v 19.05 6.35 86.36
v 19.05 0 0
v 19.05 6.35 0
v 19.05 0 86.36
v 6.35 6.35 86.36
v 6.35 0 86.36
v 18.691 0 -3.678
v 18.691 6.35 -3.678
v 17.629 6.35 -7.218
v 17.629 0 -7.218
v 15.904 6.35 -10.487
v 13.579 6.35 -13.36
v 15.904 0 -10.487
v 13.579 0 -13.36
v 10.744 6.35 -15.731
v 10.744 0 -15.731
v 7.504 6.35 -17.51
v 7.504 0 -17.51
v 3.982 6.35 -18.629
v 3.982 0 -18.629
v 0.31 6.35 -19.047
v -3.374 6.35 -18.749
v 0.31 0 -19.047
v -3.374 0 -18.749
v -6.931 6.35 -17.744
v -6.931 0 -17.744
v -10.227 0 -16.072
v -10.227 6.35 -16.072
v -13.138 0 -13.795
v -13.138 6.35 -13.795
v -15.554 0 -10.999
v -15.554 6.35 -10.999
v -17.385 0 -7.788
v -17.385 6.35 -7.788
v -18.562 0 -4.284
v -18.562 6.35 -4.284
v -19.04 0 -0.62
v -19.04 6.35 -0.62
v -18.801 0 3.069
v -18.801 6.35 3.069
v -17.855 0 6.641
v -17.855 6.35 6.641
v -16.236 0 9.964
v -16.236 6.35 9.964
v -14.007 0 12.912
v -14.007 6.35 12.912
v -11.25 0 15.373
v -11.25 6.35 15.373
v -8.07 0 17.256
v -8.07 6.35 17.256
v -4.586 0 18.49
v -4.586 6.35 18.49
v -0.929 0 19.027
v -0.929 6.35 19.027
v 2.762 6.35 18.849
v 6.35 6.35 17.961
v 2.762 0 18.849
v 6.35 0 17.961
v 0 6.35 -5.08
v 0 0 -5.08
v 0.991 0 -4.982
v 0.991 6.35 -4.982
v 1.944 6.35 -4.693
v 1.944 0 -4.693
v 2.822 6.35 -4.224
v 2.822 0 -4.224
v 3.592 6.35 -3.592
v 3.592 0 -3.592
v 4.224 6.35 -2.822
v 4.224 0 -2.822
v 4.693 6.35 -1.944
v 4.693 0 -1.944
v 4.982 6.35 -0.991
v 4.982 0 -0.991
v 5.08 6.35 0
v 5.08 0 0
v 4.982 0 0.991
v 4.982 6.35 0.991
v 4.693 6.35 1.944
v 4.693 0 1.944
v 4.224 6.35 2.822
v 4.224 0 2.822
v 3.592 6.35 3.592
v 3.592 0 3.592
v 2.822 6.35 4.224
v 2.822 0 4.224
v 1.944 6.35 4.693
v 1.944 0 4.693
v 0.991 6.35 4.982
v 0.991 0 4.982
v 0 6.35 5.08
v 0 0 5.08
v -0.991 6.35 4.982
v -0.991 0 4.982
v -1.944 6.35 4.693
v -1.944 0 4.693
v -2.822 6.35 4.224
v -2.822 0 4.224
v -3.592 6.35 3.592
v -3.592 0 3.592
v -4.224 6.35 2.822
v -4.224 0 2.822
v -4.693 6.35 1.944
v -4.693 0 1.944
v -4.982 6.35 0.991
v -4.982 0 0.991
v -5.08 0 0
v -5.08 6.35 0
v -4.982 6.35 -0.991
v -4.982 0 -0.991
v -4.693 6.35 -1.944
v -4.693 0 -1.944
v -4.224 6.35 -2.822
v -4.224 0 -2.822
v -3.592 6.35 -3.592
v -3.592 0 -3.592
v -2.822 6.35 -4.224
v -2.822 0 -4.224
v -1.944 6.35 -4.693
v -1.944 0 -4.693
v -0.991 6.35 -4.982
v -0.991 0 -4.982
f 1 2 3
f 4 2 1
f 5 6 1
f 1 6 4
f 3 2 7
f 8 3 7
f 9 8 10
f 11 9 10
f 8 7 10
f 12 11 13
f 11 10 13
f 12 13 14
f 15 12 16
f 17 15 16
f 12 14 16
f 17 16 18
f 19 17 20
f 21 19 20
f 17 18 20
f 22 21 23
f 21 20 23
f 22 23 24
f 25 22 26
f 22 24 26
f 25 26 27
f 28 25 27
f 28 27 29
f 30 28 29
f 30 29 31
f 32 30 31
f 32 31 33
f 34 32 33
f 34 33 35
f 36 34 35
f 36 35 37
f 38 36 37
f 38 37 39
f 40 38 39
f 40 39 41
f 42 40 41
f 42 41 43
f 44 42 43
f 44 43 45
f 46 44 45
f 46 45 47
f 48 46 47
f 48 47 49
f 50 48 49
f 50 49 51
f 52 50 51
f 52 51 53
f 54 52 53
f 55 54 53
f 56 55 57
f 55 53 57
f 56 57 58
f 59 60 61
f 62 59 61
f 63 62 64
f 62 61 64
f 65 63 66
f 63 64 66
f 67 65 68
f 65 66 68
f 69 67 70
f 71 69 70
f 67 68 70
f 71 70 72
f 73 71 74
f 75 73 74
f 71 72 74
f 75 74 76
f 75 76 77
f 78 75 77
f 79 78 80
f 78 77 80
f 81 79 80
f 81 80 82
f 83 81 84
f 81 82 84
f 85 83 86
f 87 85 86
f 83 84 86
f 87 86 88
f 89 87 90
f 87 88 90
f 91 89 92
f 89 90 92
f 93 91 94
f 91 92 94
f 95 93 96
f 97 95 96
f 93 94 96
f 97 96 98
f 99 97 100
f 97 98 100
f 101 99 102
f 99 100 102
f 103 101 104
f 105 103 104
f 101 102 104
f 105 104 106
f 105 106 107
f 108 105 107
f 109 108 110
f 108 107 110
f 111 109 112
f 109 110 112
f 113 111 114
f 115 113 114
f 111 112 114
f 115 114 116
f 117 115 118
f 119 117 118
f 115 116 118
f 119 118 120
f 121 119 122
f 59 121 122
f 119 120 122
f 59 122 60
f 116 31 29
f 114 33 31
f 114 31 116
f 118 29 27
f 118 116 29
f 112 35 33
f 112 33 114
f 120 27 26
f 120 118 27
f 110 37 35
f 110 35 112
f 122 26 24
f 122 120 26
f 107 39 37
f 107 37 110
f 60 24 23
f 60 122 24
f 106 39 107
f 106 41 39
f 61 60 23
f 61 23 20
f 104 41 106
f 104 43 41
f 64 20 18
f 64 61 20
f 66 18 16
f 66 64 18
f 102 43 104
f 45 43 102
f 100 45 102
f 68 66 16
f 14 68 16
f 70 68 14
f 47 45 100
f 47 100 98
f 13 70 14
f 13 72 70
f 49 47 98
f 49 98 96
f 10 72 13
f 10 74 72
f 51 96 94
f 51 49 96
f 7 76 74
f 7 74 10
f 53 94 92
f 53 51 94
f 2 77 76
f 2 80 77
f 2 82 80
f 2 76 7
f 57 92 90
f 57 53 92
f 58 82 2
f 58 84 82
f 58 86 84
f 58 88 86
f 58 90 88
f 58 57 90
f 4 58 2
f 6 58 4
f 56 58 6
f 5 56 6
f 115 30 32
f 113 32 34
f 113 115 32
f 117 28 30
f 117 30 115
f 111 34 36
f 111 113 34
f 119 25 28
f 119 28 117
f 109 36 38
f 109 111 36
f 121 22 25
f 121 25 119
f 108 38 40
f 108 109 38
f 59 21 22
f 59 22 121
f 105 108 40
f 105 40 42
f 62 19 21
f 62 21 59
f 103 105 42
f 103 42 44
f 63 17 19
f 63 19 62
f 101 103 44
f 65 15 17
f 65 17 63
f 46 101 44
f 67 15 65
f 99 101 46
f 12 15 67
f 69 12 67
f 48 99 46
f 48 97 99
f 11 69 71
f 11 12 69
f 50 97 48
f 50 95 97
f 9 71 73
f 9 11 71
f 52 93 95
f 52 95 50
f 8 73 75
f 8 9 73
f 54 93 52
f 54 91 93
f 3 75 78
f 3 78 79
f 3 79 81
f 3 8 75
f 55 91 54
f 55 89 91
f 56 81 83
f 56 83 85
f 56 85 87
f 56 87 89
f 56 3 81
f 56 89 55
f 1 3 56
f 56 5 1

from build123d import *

# Parameters (mm, degrees)
SKETCH1_R           = 19.05
BOSS_EXTRUDE1_DEPTH = 6.35
SKETCH2_W           = 12.7
SKETCH2_H           = 86.36
BOSS_EXTRUDE2_DEPTH = 6.35
SKETCH3_R           = 5.08
CUT_EXTRUDE1_DEPTH  = 6.35


with BuildPart() as part:
    # Sketch1 → Boss-Extrude1 (new body)
    with BuildSketch(Plane(origin=(0, 0, 0), x_dir=(1, 0, 0), z_dir=(0, 1, 0))):
        with Locations(Location((0, 0, 0), (0, 0, 270))):
            Circle(SKETCH1_R)
    extrude(amount=BOSS_EXTRUDE1_DEPTH)

    # Sketch2 → Boss-Extrude2 (add)
    with BuildSketch(Plane.XZ):
        with Locations((12.7, 43.18)):
            Rectangle(SKETCH2_W, SKETCH2_H)
    extrude(amount=-BOSS_EXTRUDE2_DEPTH)

    # Sketch3 → Cut-Extrude1 (cut)
    with BuildSketch(Plane.XZ):
        with Locations(Location((0, 0, 0), (0, 0, 270))):
            Circle(SKETCH3_R)
    extrude(amount=-CUT_EXTRUDE1_DEPTH, mode=Mode.SUBTRACT)


solid = part.part
